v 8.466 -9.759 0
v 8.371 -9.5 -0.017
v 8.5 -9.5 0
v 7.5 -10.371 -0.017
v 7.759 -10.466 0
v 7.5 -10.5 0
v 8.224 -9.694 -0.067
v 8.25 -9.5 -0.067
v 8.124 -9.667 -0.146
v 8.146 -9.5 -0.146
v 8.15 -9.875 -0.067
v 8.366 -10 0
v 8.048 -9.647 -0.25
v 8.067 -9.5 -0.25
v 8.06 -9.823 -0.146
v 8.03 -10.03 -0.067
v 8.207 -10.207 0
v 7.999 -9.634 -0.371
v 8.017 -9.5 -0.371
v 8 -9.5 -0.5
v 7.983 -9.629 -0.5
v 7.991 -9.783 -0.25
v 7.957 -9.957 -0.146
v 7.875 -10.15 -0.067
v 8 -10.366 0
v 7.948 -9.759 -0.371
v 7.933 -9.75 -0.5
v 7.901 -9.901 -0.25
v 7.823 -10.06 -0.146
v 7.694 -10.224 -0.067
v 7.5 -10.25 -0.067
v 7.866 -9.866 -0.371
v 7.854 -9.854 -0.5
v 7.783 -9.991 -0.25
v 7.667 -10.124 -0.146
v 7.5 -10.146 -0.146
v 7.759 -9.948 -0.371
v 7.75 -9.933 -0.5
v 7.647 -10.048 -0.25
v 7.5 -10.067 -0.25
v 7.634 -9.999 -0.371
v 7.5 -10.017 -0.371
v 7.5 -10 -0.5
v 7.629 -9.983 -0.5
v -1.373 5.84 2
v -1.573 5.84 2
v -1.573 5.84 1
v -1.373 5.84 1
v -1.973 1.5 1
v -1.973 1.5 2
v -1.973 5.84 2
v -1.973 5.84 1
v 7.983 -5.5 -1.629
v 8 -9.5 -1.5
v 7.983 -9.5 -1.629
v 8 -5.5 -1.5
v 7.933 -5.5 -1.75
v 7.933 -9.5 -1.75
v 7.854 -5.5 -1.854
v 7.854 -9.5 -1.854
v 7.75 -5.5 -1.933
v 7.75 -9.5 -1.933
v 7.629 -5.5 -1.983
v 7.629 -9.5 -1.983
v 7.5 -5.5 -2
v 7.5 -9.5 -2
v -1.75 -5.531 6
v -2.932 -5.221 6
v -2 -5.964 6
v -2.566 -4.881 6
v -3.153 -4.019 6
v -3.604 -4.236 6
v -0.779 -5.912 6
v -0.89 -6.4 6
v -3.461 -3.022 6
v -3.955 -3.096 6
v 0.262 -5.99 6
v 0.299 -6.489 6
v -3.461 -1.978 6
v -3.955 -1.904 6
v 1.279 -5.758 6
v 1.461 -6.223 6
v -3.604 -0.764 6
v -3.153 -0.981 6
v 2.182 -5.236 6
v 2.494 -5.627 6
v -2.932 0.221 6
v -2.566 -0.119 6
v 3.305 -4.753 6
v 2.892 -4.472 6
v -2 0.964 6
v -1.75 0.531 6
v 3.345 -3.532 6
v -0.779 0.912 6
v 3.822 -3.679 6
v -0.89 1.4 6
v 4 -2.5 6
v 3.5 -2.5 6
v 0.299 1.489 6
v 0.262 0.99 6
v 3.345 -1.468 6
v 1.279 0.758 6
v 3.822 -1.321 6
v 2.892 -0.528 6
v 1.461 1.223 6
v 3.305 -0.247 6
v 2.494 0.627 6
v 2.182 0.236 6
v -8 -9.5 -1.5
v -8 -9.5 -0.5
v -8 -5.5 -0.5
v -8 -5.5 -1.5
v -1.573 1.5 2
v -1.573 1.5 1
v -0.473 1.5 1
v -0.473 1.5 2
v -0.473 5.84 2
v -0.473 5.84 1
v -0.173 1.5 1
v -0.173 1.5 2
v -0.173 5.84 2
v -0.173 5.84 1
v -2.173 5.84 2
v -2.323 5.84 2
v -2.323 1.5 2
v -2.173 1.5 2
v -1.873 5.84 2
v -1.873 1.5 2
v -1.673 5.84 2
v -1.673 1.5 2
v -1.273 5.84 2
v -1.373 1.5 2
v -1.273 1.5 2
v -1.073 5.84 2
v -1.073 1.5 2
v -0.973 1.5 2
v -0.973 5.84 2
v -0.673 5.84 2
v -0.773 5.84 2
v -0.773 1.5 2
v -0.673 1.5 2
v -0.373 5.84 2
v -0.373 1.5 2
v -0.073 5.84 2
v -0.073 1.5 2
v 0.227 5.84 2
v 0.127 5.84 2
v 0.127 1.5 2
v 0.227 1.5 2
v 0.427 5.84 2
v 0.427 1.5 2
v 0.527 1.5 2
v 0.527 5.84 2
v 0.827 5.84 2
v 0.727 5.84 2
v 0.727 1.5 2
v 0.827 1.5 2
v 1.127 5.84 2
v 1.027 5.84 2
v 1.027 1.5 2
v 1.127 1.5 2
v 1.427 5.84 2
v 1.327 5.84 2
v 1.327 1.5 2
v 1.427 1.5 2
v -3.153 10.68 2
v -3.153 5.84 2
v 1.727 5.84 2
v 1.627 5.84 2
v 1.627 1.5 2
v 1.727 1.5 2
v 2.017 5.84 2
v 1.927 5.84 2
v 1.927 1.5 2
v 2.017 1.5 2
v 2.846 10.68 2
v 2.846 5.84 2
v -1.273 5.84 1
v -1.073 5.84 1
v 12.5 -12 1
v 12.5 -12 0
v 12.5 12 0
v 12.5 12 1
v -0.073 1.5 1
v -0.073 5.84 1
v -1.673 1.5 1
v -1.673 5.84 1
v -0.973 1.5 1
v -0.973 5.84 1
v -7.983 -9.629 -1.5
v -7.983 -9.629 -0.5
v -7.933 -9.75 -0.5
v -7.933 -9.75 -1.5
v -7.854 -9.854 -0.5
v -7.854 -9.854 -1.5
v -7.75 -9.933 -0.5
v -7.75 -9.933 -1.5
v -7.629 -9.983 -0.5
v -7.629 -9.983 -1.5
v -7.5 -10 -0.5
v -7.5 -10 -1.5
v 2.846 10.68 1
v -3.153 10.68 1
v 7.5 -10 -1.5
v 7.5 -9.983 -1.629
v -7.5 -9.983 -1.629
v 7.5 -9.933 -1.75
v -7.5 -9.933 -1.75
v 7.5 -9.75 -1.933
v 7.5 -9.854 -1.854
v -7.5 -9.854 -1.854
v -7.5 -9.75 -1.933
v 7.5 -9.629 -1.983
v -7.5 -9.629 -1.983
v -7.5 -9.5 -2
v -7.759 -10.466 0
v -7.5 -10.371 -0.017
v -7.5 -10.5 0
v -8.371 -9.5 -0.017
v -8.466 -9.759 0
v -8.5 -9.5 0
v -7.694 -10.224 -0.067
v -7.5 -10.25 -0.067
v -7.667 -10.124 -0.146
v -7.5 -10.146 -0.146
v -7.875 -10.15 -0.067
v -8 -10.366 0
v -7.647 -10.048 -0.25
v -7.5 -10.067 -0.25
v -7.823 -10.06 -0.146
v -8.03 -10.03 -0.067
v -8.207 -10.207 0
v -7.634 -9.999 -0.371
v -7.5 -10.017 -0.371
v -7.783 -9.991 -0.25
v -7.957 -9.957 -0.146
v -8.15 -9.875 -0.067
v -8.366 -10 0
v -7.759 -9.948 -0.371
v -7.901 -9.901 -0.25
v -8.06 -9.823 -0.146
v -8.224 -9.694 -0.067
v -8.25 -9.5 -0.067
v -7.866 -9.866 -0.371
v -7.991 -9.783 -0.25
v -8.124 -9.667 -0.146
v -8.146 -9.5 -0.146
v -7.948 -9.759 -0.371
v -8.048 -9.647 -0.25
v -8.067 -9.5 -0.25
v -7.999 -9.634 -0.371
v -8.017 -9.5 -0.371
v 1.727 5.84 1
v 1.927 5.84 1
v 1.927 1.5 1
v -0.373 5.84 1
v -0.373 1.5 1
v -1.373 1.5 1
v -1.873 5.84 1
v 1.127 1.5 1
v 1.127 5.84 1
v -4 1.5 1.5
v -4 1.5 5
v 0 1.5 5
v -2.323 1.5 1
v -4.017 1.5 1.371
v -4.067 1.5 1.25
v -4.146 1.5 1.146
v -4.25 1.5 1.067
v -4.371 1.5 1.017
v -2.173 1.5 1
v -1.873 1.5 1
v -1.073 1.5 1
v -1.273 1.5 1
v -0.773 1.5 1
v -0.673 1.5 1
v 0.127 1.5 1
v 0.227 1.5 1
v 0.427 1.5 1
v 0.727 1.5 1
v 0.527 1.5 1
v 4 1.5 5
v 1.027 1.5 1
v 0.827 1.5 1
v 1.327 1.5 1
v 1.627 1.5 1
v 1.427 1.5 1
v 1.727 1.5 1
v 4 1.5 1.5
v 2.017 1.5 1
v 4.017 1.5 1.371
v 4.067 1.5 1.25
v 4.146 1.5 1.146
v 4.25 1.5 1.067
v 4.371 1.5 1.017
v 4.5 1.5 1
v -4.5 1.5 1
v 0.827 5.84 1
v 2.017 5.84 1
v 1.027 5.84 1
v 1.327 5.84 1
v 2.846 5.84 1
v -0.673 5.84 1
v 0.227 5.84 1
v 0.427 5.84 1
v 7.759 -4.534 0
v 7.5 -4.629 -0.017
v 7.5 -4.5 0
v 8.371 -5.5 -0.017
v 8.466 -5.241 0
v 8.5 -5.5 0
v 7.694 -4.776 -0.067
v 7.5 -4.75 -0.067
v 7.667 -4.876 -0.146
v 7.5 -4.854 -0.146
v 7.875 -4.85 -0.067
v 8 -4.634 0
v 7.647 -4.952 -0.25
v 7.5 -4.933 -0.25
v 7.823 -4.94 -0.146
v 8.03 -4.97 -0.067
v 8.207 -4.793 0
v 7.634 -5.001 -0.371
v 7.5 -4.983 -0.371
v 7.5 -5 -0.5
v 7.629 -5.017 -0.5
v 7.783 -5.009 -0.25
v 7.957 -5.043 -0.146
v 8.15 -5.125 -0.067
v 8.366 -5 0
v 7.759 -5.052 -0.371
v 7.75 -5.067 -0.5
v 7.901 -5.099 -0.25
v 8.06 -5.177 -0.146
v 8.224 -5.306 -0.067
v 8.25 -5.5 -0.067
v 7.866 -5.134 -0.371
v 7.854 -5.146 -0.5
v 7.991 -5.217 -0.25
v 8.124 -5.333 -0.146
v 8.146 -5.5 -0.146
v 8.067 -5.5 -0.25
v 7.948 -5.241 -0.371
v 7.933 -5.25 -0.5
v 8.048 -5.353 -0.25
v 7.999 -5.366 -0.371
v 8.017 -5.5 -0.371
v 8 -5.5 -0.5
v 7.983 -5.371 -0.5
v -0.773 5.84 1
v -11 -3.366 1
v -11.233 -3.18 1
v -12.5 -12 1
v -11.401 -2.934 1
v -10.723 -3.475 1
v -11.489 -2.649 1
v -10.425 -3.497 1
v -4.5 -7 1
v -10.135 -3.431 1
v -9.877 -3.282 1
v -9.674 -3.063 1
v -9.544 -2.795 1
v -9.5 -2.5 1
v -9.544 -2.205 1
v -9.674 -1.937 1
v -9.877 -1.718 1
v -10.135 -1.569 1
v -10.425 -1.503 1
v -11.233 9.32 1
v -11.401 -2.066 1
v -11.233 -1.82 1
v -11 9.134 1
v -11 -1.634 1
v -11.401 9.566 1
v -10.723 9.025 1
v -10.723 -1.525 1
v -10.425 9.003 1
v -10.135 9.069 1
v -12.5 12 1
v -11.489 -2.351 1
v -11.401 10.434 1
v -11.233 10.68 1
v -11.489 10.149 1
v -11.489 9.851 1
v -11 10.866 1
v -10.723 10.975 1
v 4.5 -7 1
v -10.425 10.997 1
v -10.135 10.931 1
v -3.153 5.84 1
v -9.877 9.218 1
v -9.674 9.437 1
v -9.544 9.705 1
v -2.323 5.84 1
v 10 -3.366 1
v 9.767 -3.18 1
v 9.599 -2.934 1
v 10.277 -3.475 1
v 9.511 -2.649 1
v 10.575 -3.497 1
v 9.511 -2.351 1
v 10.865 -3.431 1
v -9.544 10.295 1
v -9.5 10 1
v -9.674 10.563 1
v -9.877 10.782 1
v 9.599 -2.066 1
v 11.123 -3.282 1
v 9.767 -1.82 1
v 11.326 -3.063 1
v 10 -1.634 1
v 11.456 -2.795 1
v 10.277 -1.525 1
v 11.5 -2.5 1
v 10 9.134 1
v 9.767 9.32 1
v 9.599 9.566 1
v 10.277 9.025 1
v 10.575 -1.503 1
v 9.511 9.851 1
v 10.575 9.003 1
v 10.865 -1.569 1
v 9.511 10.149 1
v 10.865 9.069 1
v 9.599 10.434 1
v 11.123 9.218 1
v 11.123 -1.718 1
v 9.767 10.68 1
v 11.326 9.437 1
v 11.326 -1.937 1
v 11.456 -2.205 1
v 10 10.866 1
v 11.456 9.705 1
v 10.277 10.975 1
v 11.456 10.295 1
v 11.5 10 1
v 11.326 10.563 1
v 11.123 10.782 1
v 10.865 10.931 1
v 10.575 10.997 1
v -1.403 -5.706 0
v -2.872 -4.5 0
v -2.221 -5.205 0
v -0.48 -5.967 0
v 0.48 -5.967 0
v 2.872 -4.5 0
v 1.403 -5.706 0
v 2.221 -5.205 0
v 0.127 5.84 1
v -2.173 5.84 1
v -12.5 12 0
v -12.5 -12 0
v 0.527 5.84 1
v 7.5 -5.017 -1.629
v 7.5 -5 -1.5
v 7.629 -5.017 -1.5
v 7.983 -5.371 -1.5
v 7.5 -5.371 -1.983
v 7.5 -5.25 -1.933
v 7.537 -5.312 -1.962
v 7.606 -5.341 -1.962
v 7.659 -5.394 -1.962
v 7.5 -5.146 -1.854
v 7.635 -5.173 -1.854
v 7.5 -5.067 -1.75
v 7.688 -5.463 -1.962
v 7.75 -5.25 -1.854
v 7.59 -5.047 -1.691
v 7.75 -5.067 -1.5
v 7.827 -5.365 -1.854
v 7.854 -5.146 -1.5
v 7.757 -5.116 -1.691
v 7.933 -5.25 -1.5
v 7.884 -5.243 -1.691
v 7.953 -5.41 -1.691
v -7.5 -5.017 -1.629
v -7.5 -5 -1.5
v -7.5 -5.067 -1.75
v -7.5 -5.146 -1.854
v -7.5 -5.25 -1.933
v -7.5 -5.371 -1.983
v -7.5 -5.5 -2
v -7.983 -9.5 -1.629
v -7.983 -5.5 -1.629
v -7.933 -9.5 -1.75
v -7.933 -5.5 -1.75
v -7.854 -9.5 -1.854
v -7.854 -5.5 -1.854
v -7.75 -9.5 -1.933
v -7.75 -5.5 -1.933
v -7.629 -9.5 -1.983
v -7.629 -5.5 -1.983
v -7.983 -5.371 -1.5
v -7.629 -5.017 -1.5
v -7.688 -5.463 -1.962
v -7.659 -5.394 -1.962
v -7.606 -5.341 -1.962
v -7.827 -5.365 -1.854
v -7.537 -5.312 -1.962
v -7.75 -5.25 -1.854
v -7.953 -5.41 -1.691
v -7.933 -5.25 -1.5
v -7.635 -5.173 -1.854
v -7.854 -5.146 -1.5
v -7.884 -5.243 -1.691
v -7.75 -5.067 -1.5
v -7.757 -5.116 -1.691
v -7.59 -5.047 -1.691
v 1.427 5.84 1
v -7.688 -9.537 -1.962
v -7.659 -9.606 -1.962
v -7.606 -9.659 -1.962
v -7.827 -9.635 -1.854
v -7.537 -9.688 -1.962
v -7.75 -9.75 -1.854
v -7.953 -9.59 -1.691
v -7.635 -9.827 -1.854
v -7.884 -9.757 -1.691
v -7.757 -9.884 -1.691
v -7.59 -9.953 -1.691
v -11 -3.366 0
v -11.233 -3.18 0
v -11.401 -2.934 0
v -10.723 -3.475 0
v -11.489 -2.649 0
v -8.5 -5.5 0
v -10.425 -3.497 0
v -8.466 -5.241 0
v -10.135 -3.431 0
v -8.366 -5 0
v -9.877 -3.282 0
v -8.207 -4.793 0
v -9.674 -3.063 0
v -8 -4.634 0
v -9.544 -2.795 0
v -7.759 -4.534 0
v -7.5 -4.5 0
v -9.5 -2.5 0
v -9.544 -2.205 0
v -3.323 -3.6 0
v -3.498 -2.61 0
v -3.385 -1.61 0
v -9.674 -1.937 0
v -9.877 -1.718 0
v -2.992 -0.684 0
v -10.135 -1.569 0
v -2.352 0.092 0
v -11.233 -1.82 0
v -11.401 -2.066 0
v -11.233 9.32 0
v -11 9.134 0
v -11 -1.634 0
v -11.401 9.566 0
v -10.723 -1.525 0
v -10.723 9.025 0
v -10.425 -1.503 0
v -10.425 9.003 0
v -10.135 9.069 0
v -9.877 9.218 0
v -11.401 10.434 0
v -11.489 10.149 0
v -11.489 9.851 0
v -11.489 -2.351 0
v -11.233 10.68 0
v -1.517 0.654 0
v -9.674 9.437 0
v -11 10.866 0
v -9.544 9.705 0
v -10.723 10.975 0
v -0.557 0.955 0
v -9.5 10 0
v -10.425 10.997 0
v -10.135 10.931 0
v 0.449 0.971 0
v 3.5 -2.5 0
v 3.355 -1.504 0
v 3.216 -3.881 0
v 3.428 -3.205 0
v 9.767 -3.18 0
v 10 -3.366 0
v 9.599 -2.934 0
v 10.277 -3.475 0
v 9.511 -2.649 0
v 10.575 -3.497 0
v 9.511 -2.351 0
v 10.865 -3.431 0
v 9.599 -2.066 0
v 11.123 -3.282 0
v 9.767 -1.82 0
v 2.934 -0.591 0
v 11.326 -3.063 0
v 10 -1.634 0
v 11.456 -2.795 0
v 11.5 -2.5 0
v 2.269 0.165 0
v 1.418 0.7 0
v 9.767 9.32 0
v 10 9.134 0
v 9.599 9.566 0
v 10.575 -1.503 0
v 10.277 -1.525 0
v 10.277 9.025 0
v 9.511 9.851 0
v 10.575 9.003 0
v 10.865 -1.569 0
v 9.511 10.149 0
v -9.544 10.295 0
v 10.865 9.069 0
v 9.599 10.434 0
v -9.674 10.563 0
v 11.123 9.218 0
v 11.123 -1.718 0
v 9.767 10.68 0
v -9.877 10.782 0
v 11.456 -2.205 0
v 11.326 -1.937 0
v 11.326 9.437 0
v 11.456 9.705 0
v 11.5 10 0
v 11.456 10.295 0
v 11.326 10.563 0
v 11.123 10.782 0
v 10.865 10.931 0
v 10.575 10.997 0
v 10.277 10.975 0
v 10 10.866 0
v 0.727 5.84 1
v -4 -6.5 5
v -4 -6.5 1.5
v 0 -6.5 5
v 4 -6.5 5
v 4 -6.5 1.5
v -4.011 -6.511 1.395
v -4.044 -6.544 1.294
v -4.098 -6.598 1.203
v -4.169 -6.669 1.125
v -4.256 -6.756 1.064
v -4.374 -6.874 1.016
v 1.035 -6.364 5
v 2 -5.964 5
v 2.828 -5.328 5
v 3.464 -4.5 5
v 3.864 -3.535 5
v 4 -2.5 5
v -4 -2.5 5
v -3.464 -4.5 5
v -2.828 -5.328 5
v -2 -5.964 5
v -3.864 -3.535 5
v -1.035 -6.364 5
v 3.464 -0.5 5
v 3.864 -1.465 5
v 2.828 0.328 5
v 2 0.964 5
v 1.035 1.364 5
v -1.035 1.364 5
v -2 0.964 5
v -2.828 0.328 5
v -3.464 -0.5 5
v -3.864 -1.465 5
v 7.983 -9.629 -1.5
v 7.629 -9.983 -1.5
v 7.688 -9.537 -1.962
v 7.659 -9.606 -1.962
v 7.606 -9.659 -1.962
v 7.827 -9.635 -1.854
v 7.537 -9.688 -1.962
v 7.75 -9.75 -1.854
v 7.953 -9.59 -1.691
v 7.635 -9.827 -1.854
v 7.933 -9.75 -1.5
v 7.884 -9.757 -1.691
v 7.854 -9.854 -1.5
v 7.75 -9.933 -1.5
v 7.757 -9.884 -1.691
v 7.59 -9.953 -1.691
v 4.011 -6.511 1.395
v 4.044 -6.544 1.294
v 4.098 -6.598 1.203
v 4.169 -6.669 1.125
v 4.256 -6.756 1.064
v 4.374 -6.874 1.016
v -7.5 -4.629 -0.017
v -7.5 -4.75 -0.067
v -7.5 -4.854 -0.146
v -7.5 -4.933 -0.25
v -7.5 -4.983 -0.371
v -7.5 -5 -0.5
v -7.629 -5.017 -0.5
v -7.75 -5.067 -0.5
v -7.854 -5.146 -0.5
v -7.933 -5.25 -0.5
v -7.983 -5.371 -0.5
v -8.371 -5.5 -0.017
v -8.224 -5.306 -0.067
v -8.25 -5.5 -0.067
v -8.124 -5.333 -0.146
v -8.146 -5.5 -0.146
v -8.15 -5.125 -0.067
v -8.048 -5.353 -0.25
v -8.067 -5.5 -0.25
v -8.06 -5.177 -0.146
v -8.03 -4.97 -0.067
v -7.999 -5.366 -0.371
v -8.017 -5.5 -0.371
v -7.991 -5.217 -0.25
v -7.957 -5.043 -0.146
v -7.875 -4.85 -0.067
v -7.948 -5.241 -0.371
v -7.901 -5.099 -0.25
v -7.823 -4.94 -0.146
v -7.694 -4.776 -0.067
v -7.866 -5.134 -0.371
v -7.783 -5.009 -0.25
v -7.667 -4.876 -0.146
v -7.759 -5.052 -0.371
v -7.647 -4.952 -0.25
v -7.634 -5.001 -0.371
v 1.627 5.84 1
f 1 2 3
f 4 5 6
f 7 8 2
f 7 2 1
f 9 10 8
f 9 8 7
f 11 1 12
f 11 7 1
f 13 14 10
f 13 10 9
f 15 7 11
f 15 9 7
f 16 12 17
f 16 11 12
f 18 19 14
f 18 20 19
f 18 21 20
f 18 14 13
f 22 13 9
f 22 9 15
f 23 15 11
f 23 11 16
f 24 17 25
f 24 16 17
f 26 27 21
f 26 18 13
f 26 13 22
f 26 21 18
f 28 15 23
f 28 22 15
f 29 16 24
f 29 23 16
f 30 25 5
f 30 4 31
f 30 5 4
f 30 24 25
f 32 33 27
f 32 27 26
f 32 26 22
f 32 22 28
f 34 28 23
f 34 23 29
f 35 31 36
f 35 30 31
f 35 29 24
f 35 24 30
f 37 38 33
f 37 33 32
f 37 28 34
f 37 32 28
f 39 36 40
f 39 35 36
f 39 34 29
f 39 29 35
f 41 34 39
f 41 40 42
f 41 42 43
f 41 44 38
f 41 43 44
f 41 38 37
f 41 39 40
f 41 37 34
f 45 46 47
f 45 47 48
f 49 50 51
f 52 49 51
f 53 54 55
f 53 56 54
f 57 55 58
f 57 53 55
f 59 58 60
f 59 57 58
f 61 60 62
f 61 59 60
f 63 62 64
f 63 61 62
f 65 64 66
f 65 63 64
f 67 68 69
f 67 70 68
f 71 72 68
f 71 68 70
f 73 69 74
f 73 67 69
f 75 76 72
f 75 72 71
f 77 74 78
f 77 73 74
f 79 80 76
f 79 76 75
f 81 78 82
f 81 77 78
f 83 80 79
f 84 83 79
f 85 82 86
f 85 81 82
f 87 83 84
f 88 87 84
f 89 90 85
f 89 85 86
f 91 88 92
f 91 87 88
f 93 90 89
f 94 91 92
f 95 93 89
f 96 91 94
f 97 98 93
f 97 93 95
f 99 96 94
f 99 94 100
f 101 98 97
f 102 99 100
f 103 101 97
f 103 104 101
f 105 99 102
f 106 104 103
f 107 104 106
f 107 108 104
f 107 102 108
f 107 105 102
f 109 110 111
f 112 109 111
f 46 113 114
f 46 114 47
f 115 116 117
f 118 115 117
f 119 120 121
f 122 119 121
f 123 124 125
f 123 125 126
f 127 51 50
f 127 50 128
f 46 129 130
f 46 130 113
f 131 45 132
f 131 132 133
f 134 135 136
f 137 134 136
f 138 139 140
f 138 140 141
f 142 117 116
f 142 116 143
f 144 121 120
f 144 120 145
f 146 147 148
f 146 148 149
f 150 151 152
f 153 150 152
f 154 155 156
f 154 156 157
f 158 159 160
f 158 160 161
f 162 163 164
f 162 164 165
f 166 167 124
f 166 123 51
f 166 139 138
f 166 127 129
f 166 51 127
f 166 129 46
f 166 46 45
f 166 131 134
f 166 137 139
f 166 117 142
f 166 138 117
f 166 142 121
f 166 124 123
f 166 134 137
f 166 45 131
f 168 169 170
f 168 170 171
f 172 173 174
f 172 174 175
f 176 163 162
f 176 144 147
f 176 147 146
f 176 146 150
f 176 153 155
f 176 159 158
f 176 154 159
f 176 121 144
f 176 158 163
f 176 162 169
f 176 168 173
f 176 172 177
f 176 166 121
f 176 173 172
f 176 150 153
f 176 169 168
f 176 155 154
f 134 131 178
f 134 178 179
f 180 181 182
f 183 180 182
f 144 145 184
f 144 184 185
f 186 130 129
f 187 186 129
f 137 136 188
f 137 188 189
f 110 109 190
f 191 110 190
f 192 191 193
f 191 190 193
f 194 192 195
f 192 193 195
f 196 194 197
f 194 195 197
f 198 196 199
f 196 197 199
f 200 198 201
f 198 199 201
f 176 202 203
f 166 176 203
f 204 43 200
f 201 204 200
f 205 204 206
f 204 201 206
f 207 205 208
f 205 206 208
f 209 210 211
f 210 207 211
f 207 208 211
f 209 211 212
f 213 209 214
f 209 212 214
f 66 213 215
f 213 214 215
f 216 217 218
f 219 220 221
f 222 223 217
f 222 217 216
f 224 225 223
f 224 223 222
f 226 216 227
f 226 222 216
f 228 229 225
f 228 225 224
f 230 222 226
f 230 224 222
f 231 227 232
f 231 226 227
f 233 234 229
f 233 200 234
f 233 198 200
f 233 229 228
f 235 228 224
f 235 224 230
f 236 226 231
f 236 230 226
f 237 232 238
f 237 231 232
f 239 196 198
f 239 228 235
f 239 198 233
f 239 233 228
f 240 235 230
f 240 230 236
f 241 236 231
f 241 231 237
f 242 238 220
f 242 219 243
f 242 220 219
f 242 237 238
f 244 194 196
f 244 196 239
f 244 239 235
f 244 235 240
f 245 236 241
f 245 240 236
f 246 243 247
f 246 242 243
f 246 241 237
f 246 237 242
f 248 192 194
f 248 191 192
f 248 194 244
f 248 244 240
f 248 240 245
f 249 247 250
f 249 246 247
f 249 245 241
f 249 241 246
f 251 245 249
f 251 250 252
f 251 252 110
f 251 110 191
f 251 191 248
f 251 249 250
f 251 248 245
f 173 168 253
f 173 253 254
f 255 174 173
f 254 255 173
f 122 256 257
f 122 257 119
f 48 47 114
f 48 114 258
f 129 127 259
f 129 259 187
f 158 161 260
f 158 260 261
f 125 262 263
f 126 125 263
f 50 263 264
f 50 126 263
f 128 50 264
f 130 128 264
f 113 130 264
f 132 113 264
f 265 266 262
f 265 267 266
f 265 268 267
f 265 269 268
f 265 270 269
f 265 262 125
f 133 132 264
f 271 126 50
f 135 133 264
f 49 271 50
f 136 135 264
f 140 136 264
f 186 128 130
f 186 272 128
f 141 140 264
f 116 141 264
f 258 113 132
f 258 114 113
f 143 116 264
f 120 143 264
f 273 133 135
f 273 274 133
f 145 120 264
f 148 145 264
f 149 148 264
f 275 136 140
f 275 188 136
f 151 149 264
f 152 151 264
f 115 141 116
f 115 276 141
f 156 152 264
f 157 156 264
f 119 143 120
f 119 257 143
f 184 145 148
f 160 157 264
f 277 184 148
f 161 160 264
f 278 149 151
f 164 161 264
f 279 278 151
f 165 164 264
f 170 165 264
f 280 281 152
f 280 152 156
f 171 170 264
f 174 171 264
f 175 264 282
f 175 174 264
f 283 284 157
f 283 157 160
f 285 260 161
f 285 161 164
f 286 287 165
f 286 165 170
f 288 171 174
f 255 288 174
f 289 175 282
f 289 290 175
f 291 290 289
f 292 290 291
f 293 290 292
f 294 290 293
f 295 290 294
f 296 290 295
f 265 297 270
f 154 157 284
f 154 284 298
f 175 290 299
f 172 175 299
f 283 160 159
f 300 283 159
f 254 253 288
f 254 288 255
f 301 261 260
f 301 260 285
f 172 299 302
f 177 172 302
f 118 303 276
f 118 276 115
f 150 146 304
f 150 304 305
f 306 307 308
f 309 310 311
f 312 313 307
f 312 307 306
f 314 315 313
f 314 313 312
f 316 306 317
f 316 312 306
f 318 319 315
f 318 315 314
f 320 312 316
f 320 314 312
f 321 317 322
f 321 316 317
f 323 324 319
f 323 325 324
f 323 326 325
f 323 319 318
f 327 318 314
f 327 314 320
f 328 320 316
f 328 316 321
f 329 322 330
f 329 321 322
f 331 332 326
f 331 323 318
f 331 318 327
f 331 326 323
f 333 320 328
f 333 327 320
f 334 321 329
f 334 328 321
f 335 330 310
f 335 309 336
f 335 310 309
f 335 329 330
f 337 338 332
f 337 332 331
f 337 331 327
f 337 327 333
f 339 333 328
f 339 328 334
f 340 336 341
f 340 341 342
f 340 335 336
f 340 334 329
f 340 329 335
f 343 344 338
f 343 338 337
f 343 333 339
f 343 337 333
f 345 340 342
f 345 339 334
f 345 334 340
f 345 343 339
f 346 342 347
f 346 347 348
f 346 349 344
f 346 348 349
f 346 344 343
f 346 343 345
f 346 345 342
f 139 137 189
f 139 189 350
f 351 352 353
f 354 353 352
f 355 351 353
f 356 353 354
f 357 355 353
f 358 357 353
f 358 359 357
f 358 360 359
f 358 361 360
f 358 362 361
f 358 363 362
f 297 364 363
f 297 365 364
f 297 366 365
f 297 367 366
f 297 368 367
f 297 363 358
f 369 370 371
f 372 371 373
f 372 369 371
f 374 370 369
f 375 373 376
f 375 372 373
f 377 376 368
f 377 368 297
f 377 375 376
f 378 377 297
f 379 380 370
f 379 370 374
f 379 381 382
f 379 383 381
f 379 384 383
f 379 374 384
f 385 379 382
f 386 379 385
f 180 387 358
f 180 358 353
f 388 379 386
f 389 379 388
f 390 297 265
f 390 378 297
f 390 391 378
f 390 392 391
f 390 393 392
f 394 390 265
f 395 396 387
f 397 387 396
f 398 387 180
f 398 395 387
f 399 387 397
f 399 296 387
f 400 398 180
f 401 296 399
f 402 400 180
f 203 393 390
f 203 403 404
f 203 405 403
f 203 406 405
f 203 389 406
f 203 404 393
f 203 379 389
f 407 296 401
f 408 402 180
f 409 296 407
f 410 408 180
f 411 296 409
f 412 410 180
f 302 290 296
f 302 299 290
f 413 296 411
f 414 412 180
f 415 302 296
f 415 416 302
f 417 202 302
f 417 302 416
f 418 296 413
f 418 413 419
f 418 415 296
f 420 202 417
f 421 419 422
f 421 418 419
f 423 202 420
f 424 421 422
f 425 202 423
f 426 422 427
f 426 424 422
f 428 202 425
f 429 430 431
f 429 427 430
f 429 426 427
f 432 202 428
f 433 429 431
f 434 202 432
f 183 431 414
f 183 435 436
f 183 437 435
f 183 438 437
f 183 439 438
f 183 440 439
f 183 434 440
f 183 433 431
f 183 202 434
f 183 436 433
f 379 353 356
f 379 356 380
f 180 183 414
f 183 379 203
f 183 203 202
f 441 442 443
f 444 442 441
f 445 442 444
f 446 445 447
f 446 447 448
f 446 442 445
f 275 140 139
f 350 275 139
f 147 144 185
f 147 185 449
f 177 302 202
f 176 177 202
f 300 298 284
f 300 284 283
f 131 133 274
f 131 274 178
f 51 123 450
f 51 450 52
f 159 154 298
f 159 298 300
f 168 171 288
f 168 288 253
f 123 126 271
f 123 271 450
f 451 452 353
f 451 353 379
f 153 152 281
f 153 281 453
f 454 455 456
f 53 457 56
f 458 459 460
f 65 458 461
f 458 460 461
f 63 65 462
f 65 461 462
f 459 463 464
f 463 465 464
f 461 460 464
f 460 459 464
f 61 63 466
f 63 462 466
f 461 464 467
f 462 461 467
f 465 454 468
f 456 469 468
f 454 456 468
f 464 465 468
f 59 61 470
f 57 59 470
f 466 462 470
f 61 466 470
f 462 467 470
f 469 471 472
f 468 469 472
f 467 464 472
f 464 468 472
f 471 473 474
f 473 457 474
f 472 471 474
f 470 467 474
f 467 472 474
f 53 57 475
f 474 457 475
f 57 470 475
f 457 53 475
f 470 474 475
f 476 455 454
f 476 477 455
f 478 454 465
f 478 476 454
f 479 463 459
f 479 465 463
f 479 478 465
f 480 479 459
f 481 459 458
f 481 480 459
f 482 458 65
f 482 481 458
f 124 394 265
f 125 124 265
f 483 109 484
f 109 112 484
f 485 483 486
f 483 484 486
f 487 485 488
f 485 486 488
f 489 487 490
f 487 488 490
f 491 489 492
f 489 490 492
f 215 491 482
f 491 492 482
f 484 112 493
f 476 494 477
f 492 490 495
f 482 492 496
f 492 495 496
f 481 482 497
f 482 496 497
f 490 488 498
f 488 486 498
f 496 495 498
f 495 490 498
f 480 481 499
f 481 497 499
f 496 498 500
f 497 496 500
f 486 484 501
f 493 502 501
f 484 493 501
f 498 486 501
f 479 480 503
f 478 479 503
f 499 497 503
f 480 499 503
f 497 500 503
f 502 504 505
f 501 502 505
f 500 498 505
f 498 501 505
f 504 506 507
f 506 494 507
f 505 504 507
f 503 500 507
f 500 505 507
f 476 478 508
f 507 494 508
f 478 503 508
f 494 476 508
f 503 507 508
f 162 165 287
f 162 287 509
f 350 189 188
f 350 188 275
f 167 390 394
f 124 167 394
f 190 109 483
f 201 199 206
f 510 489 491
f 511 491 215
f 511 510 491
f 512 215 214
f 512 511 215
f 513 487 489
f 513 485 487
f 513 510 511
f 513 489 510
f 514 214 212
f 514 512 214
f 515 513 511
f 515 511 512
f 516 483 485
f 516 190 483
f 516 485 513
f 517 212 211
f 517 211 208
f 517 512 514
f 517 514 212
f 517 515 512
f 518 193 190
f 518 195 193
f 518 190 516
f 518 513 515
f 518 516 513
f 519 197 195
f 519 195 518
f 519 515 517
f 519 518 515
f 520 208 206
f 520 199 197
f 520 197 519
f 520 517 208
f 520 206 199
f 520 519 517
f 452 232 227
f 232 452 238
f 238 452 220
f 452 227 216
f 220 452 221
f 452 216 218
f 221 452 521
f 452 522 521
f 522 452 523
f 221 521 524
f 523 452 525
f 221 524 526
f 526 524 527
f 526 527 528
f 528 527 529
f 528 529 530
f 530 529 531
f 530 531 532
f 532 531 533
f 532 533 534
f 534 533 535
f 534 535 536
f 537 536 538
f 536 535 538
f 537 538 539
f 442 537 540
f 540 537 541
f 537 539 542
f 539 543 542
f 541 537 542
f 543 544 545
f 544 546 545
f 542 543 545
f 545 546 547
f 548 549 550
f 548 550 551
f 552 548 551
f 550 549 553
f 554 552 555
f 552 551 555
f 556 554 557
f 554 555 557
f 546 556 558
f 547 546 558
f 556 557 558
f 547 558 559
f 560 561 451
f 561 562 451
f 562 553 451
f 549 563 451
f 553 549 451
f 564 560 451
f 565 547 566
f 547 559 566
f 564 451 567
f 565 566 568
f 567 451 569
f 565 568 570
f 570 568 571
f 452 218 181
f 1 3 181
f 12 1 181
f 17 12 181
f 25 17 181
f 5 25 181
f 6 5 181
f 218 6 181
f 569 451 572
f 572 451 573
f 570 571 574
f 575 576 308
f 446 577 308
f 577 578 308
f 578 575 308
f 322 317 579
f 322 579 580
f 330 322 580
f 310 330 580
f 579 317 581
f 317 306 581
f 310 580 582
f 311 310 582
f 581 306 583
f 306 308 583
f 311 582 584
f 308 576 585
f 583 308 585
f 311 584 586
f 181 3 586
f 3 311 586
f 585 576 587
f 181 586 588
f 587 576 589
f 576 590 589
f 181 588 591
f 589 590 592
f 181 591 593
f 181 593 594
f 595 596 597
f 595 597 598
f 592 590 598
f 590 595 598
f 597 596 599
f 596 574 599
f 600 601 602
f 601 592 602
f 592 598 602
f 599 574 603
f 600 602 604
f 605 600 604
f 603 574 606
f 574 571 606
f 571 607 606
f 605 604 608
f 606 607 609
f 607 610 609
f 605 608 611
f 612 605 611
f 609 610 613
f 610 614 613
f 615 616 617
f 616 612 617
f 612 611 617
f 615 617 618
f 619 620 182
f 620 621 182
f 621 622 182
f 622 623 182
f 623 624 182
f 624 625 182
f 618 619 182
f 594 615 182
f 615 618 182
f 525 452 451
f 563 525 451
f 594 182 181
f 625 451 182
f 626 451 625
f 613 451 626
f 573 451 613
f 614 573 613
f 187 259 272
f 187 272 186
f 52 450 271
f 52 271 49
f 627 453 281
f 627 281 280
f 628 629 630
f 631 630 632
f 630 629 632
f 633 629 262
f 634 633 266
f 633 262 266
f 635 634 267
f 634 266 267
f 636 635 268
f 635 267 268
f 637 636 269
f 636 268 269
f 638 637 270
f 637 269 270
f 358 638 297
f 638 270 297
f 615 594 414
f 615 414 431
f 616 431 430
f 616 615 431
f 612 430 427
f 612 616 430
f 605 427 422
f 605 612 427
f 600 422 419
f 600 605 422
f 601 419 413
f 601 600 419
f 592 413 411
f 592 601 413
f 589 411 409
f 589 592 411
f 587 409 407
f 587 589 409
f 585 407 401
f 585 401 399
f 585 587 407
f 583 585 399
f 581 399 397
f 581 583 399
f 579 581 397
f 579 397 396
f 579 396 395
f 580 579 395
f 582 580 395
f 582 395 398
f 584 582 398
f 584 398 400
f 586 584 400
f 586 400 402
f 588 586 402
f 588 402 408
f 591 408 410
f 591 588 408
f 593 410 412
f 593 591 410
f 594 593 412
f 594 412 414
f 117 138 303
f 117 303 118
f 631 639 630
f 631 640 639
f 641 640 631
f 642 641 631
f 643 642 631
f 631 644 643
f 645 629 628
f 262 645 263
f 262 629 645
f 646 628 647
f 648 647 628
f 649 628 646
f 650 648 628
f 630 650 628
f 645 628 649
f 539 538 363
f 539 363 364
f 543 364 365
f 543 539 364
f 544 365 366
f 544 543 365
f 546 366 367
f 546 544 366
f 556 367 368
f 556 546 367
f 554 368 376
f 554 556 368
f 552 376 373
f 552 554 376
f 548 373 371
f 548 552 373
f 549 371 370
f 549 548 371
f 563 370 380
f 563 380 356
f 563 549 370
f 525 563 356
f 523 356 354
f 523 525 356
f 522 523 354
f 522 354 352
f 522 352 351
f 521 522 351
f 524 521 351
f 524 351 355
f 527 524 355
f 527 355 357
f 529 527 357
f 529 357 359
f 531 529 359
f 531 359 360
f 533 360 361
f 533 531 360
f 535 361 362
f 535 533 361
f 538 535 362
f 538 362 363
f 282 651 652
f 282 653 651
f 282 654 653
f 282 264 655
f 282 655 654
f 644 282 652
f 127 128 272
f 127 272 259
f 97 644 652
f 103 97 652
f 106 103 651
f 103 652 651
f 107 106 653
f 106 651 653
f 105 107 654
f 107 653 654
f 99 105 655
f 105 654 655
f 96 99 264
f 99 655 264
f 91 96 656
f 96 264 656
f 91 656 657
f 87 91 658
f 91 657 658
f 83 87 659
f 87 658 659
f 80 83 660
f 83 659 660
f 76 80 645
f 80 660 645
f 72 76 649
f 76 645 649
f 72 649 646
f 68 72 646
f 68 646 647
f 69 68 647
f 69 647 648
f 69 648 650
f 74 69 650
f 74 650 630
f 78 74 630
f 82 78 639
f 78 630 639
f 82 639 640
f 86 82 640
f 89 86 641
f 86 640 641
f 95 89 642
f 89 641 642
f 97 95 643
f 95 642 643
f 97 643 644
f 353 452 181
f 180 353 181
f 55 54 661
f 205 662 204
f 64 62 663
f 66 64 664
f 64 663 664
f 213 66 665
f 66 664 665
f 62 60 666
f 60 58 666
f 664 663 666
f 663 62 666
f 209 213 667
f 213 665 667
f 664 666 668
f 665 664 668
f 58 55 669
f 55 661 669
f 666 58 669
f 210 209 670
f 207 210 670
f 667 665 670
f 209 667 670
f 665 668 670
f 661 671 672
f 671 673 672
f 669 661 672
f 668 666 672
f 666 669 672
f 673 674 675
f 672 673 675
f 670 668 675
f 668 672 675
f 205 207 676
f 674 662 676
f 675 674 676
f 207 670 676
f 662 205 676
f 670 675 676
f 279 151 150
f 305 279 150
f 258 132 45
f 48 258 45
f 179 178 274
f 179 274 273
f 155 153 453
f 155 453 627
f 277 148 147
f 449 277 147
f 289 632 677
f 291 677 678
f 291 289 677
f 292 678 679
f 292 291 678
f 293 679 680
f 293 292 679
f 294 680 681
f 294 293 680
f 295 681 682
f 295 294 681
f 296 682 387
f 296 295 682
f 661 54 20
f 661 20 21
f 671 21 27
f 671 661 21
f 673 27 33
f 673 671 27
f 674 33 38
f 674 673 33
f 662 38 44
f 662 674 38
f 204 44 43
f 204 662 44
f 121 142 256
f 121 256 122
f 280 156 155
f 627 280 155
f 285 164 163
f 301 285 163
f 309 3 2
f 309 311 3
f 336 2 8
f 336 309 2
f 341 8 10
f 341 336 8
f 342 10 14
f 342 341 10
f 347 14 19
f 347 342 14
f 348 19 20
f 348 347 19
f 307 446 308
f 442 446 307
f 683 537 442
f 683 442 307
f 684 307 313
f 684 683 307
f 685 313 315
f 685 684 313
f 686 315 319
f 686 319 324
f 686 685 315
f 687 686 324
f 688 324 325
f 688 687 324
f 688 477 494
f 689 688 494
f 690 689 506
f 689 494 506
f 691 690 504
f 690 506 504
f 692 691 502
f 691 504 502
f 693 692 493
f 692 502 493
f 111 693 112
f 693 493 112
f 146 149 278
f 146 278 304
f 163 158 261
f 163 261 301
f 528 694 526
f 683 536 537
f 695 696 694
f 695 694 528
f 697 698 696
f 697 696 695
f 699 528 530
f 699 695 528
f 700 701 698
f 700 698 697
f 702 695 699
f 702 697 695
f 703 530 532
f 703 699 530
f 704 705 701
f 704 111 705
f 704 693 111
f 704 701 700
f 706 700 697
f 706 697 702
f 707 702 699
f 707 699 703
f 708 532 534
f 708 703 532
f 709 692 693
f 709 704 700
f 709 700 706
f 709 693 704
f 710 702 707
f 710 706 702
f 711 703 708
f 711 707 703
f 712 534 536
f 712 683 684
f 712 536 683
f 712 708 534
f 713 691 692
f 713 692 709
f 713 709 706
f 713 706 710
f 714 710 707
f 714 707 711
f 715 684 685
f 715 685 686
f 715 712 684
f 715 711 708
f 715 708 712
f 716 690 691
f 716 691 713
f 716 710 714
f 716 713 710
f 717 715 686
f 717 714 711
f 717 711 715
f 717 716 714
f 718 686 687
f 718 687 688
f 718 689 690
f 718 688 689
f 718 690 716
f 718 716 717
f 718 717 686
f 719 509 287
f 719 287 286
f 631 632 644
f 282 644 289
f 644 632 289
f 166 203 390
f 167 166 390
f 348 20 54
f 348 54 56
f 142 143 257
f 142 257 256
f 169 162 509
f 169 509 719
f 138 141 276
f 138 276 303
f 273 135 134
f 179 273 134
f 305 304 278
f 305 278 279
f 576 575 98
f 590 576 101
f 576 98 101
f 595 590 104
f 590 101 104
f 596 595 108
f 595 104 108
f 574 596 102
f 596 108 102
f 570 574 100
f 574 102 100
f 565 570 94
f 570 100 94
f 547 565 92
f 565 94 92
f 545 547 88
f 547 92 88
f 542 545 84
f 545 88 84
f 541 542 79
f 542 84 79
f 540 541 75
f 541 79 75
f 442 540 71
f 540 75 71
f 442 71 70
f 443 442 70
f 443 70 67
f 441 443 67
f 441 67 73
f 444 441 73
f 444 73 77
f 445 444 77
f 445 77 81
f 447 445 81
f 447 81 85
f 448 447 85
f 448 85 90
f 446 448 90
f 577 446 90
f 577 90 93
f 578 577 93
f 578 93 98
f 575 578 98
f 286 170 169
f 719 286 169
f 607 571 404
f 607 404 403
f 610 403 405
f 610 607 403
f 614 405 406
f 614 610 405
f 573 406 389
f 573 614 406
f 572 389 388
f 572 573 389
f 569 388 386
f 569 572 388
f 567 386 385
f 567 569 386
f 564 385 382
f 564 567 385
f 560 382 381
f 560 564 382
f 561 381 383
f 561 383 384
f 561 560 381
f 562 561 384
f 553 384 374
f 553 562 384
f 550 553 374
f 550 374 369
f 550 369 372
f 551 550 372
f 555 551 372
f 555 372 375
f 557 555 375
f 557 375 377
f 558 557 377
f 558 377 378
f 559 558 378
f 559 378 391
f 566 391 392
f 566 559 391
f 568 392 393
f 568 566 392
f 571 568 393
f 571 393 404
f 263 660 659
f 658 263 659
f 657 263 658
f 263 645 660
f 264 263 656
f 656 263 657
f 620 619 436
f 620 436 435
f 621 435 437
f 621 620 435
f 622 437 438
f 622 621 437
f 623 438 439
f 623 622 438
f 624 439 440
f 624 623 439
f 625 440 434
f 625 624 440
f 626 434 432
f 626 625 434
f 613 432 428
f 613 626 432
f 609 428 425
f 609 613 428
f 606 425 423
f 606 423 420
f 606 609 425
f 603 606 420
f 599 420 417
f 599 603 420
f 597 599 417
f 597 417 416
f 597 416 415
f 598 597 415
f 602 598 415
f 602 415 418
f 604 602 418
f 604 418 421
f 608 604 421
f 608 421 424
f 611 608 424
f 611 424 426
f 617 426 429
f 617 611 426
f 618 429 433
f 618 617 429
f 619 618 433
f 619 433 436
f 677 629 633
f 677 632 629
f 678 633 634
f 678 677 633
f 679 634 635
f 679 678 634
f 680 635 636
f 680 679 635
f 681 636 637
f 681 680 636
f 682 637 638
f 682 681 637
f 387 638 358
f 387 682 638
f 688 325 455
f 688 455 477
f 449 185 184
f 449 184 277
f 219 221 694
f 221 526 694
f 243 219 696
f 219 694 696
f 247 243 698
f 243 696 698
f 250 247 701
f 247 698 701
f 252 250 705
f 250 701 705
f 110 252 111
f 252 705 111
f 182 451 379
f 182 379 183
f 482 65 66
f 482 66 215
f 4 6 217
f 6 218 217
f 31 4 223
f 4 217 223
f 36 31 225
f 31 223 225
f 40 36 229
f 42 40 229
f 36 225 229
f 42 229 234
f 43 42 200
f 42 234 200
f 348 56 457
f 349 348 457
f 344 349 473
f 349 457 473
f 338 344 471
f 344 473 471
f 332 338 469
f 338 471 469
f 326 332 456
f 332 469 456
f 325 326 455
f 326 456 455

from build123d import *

# Parameters (mm, degrees)
SKETCH1_W           = 25
SKETCH1_H           = 24
SKETCH1_R           = 1
BOSS_EXTRUDE1_DEPTH = 1
SKETCH2_W           = 8
SKETCH2_H           = 8
BOSS_EXTRUDE2_DEPTH = 4
SKETCH3_R           = 4
BOSS_EXTRUDE3_DEPTH = 1
FILLET2_R           = 0.5
SKETCH4_W           = 16
SKETCH4_H           = 5
BOSS_EXTRUDE4_DEPTH = 2
FILLET3_R           = 0.5
SKETCH5_R           = 3.5
CUT_EXTRUDE1_DEPTH  = 6
BOSS_EXTRUDE5_DEPTH = 1
SKETCH7_W           = 0.2
SKETCH7_H           = 4.34
CUT_EXTRUDE2_DEPTH  = 1
LPATTERN1_COUNT     = 14
LPATTERN1_PITCH     = 0.3


with BuildPart() as part:
    # Sketch1 → Boss-Extrude1 (new body)
    with BuildSketch(Plane.XY):
        Rectangle(SKETCH1_W, SKETCH1_H)
        with Locations((10.5, 10)):
            Circle(SKETCH1_R, mode=Mode.SUBTRACT)
        with Locations((-10.5, 10)):
            Circle(SKETCH1_R, mode=Mode.SUBTRACT)
        with Locations((-10.5, -2.5)):
            Circle(SKETCH1_R, mode=Mode.SUBTRACT)
        with Locations((10.5, -2.5)):
            Circle(SKETCH1_R, mode=Mode.SUBTRACT)
    extrude(amount=BOSS_EXTRUDE1_DEPTH)

    # Sketch2 → Boss-Extrude2 (add)
    with BuildSketch(Plane.XY.offset(1)):
        with Locations((0, -2.5)):
            Rectangle(SKETCH2_W, SKETCH2_H)
    extrude(amount=BOSS_EXTRUDE2_DEPTH)

    # Sketch3 → Boss-Extrude3 (add)
    with BuildSketch(Plane.XY.offset(5)):
        with Locations((0, -2.5)):
            Circle(SKETCH3_R)
    extrude(amount=BOSS_EXTRUDE3_DEPTH)

    # Fillet2
    fillet2_edges = [part.edges().sort_by_distance(p)[0] for p in [
        (4, -2.5, 1),
        (-4, -2.5, 1),
        (0, -6.5, 1),
    ]]
    fillet(fillet2_edges, radius=FILLET2_R)

    # Sketch4 → Boss-Extrude4 (add)
    with BuildSketch(Plane(origin=(0, 0, 0), x_dir=(-1, 0, 0), z_dir=(0, 0, -1))):
        with Locations((0, -7.5)):
            Rectangle(SKETCH4_W, SKETCH4_H)
    extrude(amount=BOSS_EXTRUDE4_DEPTH)

    # Fillet3
    fillet3_edges = [part.edges().sort_by_distance(p)[0] for p in [
        (-8, -7.5, 0),
        (-8, -10, -1),
        (0, -5, 0),
        (-8, -5, -1),
        (8, -7.5, 0),
        (8, -5, -1),
        (0, -10, 0),
        (8, -10, -1),
        (-8, -7.5, -2),
        (0, -5, -2),
        (8, -7.5, -2),
        (0, -10, -2),
    ]]
    fillet(fillet3_edges, radius=FILLET3_R)

    # Sketch5 → Cut-Extrude1 (cut)
    with BuildSketch(Plane.XY.offset(6)):
        with Locations((0, -2.5)):
            Circle(SKETCH5_R)
    extrude(amount=-CUT_EXTRUDE1_DEPTH, mode=Mode.SUBTRACT)

    # Sketch6 → Boss-Extrude5 (add)
    with BuildSketch(Plane.XY.offset(1)):
        Polygon((-3.152517362, 10.68), (-3.152517362, 5.84), (-2.322578899, 5.84), (-2.322578899, 1.5), (2.017421101, 1.5), (2.017421101, 5.84), (2.846354447, 5.84), (2.846354447, 6.468877905), (2.846354447, 10.68), align=None)
    extrude(amount=BOSS_EXTRUDE5_DEPTH)

    # Sketch7 → Cut-Extrude2 (cut)
    with BuildSketch(Plane.XY.offset(2)):
        with Locations((-2.072578899, 3.67)):
            Rectangle(SKETCH7_W, SKETCH7_H)
    cut_extrude2 = extrude(amount=-CUT_EXTRUDE2_DEPTH, mode=Mode.SUBTRACT)

    # LPattern1: Cut-Extrude2 ×14
    with Locations(*[(i * LPATTERN1_PITCH, 0, 0) for i in range(1, LPATTERN1_COUNT)]):
        add(cut_extrude2, mode=Mode.SUBTRACT)


solid = part.part
